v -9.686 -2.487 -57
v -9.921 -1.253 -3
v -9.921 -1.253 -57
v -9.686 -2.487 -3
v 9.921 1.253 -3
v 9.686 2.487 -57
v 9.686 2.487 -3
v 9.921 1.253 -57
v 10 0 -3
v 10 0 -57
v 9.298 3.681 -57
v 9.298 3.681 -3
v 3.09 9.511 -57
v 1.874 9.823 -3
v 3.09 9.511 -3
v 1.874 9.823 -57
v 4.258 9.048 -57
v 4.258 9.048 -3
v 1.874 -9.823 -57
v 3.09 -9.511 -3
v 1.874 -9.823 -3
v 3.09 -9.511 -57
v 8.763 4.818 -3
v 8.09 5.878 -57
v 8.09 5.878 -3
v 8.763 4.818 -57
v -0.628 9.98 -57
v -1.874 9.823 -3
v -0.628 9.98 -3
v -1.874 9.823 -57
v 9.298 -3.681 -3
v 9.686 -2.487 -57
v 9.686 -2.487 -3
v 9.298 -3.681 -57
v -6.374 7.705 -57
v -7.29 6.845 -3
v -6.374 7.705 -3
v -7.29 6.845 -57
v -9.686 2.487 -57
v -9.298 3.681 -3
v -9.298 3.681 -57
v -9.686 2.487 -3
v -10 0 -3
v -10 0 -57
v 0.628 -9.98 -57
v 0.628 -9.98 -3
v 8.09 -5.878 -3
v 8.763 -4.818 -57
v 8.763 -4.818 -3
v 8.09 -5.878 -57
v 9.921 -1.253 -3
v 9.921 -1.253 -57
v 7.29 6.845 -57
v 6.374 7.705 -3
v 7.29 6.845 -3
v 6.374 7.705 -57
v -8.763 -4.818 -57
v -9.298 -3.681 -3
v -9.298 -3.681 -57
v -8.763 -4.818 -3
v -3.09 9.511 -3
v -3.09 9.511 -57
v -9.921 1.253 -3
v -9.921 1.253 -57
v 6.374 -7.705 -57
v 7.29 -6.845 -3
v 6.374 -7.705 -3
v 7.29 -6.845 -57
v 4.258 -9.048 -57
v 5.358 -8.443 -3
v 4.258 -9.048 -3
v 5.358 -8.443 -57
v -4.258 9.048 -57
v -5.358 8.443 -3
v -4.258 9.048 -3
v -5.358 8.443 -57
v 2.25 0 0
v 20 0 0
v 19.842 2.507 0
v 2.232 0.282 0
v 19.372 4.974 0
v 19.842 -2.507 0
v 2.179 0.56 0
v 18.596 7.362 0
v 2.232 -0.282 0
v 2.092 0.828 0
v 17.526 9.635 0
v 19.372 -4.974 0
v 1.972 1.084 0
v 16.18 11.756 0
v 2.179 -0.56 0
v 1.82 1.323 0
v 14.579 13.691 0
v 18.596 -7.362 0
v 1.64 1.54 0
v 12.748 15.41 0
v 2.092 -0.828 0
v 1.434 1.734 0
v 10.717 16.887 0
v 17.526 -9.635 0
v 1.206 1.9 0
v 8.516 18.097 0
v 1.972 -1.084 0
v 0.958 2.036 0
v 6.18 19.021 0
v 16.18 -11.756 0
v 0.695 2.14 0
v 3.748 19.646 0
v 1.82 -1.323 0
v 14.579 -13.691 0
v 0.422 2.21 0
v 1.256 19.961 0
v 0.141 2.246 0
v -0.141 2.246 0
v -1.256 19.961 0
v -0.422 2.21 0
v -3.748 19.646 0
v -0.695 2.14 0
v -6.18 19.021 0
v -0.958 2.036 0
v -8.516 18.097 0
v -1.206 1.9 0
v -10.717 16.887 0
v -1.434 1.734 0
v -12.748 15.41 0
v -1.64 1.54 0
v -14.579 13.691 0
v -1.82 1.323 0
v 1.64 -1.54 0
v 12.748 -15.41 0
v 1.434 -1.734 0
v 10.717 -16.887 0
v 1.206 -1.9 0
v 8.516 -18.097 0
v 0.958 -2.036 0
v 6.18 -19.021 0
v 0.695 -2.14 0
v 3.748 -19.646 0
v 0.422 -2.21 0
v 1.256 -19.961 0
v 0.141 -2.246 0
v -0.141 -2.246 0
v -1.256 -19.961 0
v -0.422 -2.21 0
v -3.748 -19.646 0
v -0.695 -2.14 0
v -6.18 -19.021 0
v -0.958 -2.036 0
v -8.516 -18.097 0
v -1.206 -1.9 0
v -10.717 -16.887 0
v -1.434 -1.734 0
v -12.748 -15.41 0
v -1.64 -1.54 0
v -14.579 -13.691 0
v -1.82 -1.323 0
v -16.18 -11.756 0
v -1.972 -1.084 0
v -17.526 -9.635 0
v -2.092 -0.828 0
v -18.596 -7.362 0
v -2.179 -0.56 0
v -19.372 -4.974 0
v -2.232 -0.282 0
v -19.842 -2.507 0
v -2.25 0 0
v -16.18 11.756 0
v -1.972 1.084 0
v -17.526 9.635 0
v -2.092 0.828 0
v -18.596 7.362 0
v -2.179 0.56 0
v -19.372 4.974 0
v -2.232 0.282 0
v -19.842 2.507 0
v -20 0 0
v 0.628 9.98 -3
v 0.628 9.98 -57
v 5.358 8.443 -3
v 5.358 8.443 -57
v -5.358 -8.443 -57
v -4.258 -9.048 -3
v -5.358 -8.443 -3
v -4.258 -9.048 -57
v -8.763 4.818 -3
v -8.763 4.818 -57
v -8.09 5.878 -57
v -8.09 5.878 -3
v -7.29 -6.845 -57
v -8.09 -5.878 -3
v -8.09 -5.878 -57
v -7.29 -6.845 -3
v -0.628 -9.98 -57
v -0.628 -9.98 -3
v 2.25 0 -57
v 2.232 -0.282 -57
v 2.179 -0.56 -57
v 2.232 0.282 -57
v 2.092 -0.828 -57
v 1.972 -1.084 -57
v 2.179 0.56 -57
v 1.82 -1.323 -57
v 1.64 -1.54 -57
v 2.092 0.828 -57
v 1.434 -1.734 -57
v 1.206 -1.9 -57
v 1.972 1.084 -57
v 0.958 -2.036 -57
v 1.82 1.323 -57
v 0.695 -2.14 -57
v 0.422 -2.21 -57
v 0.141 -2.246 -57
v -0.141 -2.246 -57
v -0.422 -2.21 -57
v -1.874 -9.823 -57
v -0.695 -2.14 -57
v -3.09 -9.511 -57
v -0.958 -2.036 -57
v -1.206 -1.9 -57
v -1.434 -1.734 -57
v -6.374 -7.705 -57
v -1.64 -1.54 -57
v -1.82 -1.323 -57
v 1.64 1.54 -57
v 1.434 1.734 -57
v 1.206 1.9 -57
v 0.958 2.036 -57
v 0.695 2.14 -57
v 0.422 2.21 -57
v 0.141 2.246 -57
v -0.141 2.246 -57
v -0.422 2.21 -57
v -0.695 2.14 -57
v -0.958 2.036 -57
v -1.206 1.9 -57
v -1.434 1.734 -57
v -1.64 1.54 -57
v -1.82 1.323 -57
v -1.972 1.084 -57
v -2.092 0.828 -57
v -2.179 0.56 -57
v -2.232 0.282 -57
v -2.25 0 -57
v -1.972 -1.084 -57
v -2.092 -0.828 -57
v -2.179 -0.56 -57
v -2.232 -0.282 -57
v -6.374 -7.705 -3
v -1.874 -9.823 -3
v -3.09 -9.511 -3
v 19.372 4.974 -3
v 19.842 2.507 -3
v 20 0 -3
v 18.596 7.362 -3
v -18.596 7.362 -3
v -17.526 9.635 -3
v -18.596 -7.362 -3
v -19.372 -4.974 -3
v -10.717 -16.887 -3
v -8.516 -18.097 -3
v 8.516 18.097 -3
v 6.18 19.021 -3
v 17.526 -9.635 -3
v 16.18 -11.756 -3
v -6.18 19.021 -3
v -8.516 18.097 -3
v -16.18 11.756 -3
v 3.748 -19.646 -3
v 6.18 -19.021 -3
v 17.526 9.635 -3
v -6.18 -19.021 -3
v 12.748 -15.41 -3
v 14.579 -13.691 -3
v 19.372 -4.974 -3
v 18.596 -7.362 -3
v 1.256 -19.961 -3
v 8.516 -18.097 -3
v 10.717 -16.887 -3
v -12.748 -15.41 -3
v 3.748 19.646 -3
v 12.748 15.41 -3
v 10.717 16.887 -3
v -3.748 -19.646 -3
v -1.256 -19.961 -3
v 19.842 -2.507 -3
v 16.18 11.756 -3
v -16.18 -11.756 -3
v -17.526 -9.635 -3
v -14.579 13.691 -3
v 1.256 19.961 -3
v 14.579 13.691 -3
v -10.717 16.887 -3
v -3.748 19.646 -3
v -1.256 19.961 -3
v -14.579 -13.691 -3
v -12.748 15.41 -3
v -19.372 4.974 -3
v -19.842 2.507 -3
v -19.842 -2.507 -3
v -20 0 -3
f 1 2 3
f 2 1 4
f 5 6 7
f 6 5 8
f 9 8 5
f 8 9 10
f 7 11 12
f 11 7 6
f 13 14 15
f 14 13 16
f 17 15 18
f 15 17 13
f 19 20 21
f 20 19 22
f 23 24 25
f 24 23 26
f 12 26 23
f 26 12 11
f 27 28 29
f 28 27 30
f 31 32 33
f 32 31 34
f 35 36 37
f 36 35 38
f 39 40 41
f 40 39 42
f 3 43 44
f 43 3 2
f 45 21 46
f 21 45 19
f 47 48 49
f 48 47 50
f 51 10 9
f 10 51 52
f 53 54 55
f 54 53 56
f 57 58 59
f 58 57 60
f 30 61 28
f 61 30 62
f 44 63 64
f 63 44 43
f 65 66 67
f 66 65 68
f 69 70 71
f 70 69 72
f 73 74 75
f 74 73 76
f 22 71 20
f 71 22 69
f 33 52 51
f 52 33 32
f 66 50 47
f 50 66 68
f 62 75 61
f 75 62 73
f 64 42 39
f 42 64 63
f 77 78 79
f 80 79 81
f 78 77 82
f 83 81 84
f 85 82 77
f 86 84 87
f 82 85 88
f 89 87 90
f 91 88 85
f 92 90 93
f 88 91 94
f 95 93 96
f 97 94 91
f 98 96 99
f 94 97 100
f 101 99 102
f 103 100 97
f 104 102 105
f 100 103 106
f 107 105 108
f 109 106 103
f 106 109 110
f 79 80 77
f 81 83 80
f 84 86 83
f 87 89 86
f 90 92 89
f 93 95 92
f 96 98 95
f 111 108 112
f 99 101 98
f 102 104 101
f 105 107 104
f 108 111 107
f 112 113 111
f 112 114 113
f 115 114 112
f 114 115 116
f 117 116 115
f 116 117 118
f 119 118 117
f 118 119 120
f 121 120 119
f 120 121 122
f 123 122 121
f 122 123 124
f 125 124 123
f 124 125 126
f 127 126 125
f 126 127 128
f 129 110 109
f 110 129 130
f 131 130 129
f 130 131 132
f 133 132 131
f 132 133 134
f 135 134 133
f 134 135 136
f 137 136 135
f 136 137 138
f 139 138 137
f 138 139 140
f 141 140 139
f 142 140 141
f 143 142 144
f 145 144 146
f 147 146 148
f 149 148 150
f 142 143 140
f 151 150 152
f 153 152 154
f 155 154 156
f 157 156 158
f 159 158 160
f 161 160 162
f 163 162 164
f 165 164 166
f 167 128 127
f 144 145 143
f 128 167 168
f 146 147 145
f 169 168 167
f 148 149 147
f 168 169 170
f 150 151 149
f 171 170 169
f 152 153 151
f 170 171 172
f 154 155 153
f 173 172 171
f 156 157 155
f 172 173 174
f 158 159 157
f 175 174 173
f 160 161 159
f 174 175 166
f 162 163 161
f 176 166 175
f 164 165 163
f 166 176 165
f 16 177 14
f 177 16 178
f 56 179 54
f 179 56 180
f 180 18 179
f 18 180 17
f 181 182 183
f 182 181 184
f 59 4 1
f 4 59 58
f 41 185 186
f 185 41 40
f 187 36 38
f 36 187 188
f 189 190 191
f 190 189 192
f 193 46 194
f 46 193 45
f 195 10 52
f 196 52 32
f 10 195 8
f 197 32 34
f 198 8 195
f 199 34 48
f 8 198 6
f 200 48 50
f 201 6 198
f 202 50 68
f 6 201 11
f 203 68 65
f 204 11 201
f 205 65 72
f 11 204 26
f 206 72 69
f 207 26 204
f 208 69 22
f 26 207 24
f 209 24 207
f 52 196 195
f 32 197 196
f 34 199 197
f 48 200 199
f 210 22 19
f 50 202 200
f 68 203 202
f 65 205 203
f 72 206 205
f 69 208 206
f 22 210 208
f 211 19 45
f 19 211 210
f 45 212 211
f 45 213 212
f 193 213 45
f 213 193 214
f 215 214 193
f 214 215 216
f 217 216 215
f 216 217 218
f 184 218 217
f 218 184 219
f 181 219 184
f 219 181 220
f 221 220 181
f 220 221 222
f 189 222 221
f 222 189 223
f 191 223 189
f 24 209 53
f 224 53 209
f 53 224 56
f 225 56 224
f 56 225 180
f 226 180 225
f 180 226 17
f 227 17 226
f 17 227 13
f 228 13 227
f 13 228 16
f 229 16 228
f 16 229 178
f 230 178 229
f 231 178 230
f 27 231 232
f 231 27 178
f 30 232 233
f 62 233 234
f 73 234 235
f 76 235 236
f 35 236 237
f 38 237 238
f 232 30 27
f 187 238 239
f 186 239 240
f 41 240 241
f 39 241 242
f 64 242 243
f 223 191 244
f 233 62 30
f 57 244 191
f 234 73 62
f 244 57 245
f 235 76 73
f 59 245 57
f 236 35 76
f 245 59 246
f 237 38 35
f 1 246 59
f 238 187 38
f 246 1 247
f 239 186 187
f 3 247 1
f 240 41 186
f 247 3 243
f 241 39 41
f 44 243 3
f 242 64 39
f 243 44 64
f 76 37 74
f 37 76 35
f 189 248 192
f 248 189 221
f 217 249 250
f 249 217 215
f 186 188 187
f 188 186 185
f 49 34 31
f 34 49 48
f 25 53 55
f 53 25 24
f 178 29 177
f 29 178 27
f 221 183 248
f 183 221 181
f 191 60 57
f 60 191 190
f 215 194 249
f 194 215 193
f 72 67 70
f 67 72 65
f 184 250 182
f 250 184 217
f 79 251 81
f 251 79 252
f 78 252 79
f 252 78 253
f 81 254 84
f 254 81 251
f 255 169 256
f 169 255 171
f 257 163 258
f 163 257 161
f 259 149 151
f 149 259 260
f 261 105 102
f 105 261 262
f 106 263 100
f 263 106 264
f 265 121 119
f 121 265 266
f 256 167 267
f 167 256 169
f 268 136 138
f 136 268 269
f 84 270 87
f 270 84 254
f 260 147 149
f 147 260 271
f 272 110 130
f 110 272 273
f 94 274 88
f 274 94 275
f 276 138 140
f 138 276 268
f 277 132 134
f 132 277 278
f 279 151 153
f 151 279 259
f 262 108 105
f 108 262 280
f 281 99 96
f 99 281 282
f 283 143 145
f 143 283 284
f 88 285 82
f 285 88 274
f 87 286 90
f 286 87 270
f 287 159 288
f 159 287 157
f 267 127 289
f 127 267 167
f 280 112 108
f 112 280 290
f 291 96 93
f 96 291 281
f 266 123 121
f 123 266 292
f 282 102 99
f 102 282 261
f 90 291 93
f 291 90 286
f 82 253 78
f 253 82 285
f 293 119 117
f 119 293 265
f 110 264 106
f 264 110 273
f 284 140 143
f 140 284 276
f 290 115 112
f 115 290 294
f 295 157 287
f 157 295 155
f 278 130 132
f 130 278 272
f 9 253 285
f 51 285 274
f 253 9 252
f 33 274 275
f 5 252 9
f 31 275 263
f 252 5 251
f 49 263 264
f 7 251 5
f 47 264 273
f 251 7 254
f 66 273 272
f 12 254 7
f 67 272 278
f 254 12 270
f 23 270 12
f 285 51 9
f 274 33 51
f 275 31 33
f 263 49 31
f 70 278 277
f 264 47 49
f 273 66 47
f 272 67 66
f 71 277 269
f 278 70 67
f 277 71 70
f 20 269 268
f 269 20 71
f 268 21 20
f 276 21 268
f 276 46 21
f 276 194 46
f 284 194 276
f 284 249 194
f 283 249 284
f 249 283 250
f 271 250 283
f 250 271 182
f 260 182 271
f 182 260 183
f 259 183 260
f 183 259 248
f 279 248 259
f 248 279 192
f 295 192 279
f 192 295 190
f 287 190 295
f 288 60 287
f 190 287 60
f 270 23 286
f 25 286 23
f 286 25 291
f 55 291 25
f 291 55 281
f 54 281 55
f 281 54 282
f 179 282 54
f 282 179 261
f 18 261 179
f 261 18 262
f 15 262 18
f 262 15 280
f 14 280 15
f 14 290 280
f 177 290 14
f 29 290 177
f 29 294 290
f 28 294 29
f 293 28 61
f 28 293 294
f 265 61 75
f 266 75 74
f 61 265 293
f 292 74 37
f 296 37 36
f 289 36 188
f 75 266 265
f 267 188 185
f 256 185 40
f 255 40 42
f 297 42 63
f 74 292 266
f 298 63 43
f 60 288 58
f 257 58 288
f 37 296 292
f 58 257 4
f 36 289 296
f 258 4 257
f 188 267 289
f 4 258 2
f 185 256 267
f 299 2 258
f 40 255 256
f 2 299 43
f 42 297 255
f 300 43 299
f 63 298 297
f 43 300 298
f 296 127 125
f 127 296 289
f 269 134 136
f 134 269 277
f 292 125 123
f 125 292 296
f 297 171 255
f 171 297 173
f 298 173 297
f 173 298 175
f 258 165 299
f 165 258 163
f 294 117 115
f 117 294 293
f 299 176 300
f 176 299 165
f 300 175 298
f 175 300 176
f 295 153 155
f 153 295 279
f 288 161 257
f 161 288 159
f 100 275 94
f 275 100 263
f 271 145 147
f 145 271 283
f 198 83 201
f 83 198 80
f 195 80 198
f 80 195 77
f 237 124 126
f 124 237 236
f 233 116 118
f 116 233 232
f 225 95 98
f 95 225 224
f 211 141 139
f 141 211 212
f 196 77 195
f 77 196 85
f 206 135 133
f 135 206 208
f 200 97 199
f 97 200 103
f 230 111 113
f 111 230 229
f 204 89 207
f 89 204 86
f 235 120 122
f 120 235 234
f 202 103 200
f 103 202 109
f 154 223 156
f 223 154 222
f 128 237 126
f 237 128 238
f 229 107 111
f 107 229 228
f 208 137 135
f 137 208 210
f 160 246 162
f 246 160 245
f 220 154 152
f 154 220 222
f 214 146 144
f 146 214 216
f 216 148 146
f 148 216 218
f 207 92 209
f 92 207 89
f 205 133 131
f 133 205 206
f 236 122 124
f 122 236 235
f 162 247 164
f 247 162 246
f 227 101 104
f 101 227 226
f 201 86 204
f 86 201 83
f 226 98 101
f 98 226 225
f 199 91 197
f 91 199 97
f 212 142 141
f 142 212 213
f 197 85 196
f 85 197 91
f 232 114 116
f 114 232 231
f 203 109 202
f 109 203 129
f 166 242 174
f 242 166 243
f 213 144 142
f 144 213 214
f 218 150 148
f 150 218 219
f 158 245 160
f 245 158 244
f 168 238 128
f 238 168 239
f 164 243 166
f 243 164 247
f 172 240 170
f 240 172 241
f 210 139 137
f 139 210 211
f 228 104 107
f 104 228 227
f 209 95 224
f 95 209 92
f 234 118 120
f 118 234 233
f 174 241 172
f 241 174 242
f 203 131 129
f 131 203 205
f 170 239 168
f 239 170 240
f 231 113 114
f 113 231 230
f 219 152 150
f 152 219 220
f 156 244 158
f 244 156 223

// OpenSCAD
$fn = 50;


difference() {
	union() {
		translate(v = [0, 0, -57.0000000000]) {
			cylinder(h = 57, r = 10.0000000000);
		}
		translate(v = [0, 0, -3.0000000000]) {
			cylinder(h = 3, r = 20.0000000000);
		}
	}
	union() {
		#translate(v = [0, 0, -57]) {
			cylinder(h = 57, r = 2.2500000000);
		}
	}
}
